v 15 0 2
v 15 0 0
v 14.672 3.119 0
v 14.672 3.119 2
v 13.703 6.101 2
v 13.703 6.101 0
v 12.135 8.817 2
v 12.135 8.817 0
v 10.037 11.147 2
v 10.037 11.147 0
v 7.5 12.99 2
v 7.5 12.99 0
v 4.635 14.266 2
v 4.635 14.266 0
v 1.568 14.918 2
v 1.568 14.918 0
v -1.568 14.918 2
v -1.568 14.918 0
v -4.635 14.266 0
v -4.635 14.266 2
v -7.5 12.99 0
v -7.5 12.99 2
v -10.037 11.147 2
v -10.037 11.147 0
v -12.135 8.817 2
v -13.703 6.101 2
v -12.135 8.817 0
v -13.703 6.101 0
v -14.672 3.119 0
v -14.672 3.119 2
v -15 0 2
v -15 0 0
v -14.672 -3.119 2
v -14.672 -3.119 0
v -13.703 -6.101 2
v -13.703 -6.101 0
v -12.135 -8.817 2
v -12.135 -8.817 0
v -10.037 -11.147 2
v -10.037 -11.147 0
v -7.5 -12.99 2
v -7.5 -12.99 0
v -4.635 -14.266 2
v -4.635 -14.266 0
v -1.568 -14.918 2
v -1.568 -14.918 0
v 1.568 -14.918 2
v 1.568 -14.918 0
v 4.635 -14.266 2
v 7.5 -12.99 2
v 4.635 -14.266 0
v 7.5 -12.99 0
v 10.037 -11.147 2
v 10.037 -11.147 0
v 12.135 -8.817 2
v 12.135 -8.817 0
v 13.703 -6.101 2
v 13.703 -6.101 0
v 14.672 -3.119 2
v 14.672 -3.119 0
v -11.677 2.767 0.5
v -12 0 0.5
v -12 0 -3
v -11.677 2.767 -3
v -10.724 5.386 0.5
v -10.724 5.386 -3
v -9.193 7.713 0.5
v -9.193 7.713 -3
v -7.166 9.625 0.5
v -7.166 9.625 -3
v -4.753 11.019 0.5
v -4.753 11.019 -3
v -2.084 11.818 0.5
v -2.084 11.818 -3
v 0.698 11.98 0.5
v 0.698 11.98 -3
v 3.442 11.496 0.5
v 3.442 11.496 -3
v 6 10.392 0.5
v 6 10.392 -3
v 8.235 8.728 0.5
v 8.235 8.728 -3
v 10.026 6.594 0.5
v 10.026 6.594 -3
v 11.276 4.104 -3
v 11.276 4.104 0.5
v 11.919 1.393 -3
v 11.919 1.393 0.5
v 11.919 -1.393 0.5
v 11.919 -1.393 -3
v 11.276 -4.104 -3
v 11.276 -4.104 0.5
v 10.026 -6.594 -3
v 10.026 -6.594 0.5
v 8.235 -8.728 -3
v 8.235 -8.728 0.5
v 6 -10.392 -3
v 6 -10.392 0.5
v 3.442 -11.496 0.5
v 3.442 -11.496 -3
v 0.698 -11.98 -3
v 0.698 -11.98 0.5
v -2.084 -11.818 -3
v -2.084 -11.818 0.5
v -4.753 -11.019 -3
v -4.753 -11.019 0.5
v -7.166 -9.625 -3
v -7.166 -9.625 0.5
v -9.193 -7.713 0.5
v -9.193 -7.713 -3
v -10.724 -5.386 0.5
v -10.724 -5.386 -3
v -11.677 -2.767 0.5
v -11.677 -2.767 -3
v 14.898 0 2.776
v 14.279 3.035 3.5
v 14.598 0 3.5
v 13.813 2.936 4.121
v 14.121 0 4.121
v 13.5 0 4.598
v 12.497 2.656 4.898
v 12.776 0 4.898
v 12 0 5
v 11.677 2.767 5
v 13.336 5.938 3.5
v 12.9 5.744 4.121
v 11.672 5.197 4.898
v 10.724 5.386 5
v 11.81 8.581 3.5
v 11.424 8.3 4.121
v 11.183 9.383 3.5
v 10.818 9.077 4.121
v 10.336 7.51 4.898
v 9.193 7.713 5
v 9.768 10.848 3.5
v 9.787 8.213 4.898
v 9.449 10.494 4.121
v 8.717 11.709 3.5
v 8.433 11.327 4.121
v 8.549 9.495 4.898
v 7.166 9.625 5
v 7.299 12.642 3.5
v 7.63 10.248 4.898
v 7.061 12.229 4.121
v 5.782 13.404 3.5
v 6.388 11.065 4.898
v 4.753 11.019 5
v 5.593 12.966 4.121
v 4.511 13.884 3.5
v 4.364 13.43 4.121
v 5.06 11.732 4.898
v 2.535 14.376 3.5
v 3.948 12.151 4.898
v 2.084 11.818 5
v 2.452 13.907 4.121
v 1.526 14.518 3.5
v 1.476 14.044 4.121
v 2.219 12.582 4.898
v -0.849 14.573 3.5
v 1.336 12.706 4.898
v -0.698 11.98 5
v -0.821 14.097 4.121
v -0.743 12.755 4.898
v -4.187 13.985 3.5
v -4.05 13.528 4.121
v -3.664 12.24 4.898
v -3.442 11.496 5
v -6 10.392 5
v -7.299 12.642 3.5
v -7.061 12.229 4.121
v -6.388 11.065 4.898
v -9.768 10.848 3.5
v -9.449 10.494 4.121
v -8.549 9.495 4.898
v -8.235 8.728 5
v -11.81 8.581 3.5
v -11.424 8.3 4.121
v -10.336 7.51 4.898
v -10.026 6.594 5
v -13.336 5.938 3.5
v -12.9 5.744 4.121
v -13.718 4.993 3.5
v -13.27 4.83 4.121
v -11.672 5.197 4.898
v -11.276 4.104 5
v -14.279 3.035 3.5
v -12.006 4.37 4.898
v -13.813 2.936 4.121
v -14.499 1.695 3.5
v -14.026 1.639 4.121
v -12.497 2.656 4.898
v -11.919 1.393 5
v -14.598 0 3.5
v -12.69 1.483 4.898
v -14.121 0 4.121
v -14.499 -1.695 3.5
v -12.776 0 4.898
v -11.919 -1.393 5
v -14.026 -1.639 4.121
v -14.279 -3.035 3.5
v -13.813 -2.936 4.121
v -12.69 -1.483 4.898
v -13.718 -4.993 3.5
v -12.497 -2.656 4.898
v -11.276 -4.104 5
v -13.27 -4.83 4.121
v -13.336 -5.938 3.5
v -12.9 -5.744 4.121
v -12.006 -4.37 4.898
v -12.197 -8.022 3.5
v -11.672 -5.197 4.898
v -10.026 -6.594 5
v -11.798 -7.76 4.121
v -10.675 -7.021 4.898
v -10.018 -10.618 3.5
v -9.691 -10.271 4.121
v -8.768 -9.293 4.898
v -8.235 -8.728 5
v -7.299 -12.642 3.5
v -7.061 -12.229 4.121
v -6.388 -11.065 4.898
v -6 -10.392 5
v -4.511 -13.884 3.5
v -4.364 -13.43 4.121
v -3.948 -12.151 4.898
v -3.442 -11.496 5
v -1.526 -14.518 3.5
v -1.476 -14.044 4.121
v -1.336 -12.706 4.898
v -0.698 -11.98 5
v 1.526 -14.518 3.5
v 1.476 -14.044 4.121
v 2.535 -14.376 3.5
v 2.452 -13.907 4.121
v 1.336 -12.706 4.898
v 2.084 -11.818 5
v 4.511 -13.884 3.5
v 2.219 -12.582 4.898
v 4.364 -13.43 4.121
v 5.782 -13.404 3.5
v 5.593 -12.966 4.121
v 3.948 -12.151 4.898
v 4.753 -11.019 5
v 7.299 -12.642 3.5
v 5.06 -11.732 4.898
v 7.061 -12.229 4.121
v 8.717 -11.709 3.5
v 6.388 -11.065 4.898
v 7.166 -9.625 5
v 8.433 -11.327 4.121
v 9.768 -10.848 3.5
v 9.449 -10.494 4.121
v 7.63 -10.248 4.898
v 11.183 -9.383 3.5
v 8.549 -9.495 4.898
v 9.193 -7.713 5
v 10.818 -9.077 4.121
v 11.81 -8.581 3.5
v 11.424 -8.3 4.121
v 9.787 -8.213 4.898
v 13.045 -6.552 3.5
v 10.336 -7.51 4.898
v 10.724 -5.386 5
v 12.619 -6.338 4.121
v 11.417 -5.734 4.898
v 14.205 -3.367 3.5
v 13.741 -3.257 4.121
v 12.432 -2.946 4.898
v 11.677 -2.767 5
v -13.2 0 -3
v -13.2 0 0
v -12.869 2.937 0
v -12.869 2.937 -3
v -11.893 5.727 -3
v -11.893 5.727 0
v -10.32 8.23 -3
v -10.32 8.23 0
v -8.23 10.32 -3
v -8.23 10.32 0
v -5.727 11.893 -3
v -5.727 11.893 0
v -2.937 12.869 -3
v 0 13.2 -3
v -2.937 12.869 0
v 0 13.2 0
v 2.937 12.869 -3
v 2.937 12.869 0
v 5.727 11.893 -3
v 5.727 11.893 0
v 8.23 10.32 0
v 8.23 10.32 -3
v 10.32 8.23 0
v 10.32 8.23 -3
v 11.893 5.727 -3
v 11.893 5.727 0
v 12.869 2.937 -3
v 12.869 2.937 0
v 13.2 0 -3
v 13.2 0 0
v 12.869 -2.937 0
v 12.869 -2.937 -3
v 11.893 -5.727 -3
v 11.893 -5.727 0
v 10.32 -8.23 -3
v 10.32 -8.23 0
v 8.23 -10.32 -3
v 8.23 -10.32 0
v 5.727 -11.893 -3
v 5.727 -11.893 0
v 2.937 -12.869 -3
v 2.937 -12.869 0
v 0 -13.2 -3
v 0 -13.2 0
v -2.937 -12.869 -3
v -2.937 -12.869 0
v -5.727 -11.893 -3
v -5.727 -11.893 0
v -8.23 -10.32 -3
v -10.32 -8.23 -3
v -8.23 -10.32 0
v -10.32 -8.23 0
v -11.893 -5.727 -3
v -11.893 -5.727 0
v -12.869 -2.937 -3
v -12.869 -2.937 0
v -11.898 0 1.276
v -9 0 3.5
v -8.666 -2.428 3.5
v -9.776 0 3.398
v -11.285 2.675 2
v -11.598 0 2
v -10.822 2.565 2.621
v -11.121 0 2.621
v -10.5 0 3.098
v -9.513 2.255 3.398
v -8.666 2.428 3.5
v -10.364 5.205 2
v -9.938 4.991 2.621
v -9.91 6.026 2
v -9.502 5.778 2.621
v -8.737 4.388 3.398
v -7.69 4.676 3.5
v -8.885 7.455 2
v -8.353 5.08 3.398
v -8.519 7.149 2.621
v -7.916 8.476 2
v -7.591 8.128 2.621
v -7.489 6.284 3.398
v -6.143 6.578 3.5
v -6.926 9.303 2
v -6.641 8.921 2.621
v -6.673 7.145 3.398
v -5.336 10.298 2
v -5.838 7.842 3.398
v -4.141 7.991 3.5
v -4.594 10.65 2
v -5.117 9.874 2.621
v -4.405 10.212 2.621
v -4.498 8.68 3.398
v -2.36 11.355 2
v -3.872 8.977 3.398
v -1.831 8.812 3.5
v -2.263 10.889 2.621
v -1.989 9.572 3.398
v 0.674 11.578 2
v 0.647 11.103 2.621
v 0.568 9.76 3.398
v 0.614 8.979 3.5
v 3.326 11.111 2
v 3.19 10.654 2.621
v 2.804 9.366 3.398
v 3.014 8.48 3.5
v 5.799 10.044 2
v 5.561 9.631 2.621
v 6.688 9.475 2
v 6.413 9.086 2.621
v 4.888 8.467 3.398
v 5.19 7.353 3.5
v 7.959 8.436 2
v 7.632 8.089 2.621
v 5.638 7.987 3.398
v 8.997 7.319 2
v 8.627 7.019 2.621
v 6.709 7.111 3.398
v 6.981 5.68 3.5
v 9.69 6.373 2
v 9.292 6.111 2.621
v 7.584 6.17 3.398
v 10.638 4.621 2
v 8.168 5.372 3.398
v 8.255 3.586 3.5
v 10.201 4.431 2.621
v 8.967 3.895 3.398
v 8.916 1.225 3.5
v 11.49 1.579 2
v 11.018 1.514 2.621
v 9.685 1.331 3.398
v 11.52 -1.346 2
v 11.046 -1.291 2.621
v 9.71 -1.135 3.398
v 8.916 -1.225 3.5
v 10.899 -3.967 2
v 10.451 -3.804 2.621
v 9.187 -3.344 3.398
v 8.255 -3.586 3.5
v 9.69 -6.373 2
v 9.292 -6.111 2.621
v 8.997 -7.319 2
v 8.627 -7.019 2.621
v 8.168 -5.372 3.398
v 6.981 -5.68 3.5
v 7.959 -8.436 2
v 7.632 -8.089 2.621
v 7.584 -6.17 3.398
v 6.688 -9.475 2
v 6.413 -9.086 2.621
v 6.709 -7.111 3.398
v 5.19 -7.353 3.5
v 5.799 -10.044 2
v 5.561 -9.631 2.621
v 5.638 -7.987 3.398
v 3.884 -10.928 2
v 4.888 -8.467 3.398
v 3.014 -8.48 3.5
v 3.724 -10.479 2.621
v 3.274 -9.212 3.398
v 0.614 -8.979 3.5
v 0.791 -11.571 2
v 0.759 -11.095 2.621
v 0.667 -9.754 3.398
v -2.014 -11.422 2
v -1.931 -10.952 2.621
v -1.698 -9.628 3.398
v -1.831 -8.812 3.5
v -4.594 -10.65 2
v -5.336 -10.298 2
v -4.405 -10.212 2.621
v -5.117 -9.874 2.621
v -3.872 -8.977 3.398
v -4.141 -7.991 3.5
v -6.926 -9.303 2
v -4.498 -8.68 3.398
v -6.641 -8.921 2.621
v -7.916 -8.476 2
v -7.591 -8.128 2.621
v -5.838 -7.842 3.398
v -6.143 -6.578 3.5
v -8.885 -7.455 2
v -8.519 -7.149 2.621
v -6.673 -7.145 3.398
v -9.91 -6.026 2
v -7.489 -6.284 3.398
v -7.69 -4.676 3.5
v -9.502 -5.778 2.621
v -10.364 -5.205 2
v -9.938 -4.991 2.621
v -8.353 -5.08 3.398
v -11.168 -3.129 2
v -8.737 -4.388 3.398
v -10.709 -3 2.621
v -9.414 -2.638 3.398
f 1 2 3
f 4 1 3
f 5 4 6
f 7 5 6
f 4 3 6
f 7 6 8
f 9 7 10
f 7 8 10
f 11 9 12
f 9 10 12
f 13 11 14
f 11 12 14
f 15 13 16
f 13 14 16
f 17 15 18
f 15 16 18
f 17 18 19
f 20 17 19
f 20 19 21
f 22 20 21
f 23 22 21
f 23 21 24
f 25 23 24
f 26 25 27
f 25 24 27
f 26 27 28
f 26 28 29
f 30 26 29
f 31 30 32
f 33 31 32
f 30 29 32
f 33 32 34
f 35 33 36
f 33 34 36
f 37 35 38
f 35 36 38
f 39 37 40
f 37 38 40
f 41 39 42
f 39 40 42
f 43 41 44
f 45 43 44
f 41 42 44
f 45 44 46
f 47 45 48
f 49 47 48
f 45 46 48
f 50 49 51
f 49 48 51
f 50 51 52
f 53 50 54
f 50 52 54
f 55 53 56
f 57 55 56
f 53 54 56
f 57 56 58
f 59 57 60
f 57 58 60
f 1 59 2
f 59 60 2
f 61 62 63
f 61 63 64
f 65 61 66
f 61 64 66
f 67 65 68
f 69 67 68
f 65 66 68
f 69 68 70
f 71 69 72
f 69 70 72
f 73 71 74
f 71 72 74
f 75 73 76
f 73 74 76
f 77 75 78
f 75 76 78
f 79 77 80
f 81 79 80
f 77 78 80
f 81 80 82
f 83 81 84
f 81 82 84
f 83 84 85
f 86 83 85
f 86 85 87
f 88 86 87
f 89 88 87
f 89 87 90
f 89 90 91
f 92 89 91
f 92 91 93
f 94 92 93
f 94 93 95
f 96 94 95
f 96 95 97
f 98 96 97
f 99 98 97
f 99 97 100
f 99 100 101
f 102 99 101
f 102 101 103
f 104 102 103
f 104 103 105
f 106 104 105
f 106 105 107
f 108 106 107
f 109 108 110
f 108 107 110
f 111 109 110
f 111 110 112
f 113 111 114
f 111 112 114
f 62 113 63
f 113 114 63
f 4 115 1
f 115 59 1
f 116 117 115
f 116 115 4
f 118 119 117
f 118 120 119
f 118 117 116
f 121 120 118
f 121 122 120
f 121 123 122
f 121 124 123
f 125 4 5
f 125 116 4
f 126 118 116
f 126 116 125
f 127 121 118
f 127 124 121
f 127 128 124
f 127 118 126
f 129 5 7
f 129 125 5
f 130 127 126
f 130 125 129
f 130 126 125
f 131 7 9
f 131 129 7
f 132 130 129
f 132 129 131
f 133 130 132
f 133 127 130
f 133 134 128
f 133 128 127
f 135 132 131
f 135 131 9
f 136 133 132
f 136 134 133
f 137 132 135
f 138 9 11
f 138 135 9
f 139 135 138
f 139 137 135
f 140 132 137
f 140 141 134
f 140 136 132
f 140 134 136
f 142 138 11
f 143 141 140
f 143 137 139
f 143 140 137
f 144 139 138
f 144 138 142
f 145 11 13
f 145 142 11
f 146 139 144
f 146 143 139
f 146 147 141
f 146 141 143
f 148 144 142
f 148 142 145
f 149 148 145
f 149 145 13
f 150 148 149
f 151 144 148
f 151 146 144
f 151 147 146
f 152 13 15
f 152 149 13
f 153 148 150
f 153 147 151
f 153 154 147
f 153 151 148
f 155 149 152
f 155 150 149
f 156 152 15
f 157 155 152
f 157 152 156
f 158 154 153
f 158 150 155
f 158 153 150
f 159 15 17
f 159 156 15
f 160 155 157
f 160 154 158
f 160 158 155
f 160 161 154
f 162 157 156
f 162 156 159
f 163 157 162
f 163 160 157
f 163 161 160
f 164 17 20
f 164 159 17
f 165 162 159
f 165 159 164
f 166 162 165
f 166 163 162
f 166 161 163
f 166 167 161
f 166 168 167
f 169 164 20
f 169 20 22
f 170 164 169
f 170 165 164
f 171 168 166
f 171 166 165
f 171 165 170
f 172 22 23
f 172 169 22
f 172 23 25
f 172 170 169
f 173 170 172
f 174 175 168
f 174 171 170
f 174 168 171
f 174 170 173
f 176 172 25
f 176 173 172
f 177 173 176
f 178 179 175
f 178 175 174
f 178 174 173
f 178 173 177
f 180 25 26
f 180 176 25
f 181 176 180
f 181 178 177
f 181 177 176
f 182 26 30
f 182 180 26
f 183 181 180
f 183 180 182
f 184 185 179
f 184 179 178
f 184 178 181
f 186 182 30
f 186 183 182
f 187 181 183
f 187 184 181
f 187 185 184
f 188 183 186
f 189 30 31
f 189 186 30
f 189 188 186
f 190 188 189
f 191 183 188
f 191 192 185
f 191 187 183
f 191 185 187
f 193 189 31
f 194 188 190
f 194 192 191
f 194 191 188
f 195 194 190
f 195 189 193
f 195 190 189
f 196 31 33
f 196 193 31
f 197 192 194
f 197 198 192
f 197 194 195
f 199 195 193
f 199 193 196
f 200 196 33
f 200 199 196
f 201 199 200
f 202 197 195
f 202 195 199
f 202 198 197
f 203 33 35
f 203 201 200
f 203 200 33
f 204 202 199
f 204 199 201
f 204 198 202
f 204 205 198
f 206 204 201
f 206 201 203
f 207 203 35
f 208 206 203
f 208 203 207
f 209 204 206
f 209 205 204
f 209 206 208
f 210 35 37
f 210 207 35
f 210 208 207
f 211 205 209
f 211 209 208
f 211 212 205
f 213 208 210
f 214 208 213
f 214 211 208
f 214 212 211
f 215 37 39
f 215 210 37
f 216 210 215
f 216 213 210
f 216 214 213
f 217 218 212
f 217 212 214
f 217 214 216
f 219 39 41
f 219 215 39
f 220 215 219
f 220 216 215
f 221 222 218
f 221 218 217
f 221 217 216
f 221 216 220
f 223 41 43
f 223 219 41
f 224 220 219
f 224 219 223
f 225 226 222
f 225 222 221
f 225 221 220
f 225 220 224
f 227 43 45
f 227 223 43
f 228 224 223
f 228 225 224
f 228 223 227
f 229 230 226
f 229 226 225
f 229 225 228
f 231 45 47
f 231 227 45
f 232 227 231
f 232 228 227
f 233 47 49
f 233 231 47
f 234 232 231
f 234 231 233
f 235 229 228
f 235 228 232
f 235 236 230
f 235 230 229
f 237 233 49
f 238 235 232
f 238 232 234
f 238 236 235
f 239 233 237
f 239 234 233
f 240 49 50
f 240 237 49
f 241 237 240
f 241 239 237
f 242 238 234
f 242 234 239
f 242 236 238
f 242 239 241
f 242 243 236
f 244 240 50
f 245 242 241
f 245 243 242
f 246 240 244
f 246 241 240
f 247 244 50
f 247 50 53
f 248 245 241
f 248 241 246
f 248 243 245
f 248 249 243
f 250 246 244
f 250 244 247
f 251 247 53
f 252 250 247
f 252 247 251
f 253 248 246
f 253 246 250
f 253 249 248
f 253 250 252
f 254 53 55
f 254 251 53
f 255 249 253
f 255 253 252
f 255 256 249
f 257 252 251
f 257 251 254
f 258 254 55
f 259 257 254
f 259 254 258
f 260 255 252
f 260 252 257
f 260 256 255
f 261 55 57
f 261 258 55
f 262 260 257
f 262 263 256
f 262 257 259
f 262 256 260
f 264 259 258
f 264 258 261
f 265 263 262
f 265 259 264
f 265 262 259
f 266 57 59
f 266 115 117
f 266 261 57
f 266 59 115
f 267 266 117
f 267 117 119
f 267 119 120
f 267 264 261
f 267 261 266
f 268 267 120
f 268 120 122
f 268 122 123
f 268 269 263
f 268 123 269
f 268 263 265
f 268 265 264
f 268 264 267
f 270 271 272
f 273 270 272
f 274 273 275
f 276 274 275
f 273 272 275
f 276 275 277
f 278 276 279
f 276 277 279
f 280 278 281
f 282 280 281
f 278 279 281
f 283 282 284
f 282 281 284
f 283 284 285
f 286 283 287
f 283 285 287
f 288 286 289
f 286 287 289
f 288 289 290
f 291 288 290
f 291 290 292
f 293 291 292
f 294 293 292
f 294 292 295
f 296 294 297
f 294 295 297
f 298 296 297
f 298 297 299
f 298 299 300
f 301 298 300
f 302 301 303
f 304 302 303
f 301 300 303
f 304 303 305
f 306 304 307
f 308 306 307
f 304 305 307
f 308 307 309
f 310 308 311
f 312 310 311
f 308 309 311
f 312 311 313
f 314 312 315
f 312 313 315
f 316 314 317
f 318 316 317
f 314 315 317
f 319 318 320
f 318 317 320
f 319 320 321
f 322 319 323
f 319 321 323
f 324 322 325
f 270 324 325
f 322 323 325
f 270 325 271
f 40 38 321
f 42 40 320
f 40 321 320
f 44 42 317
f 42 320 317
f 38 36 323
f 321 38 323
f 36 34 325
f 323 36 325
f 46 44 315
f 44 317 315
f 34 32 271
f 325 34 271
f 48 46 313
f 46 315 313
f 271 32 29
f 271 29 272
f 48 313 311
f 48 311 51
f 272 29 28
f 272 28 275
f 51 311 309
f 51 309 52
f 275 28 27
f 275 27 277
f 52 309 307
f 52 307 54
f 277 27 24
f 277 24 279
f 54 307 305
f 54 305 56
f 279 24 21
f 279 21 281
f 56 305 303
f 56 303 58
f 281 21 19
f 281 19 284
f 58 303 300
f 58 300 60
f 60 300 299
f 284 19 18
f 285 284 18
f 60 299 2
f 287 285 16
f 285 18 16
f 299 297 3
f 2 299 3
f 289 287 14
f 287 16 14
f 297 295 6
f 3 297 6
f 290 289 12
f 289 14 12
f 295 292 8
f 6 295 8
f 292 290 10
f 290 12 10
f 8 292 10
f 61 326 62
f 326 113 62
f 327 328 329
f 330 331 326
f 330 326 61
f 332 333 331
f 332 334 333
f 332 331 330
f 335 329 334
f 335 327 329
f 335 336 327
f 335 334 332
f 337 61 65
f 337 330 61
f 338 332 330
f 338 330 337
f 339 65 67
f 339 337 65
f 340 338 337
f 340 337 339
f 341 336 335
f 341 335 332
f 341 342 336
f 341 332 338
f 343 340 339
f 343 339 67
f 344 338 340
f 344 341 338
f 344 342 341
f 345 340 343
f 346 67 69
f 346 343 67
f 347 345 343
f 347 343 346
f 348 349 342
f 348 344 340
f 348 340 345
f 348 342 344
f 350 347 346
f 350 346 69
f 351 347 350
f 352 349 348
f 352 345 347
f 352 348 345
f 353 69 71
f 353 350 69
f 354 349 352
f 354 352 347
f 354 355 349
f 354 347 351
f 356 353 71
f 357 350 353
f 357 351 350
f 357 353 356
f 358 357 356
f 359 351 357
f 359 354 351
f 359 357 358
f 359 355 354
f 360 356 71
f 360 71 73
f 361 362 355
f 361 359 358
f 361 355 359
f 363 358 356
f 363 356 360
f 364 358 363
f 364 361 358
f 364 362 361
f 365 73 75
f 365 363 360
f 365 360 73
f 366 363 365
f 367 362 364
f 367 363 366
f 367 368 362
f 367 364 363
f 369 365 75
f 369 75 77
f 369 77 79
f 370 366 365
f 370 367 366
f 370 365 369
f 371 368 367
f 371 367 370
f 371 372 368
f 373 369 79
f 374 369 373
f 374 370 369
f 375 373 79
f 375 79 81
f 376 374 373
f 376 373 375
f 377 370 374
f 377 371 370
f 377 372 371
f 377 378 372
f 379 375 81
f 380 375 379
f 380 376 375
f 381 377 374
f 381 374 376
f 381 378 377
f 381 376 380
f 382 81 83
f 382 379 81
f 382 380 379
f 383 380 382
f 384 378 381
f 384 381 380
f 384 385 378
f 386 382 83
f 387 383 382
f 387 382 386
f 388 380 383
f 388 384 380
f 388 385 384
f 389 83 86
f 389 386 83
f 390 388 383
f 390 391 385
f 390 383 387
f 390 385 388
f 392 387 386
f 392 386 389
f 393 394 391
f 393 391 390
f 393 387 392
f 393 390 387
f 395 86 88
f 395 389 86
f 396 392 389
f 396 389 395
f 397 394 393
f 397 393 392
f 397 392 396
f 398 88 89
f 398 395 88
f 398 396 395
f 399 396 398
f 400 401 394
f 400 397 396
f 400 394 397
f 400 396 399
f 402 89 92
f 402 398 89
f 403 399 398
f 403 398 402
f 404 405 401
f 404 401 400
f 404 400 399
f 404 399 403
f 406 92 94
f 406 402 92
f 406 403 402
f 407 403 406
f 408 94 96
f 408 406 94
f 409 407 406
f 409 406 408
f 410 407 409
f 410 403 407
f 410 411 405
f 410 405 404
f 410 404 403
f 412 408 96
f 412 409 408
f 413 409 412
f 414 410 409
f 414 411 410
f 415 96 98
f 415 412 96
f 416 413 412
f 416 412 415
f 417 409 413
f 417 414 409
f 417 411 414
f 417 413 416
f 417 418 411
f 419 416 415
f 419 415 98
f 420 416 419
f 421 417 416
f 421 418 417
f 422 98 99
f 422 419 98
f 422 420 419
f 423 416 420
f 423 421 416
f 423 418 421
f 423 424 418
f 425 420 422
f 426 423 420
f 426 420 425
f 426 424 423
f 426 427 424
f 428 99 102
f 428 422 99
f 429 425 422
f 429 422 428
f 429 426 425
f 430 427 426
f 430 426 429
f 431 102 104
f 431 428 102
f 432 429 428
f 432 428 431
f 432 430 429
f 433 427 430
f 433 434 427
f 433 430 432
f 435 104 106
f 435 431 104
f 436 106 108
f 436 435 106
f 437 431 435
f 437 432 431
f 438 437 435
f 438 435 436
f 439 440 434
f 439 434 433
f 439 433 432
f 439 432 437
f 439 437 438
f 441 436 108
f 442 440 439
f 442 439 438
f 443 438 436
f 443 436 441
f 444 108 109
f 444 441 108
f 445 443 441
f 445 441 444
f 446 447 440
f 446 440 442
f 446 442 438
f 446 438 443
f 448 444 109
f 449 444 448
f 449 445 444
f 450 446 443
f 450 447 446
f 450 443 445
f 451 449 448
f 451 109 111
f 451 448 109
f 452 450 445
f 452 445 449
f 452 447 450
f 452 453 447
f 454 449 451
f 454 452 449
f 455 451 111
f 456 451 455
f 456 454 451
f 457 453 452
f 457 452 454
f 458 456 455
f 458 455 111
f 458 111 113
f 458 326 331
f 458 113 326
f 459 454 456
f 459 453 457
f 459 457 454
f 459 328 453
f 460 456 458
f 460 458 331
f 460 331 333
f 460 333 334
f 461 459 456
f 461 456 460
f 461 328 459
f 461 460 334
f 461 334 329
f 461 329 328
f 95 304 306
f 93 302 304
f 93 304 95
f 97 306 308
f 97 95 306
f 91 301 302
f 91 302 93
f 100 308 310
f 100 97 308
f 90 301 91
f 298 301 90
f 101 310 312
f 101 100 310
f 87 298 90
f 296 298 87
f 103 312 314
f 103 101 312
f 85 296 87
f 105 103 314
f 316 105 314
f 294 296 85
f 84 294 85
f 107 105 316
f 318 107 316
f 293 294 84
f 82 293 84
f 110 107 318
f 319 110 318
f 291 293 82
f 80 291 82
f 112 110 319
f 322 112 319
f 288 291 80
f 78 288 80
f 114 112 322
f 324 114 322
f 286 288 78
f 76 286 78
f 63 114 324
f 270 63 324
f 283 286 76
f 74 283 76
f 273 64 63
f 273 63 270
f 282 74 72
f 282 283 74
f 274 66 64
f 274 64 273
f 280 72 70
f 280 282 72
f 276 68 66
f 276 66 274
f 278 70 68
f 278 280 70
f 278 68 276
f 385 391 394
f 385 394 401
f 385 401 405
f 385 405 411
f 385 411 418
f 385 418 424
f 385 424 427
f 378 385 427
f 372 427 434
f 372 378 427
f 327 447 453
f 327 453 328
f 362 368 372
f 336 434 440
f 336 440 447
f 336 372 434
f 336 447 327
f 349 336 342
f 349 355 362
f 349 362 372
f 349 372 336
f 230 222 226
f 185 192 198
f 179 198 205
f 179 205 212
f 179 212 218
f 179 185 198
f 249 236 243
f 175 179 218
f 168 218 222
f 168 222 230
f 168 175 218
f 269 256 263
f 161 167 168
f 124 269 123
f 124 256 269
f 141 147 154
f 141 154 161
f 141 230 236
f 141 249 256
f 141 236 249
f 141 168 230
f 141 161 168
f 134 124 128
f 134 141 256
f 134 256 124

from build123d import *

# Parameters (mm, degrees)
SKETCH1_R           = 15
BOSS_EXTRUDE1_DEPTH = 5
FILLET1_R           = 3
SKETCH2_R           = 12
CUT_EXTRUDE1_DEPTH  = 3.5
FILLET2_R           = 3
SKETCH4_R           = 13.2
BOSS_EXTRUDE3_DEPTH = 3
SKETCH5_R           = 12
CUT_EXTRUDE2_DEPTH  = 3


with BuildPart() as part:
    # Sketch1 → Boss-Extrude1 (new body)
    with BuildSketch(Plane.XY):
        Circle(SKETCH1_R)
    extrude(amount=BOSS_EXTRUDE1_DEPTH)

    # Fillet1
    fillet1_edges = [part.edges().sort_by_distance(p)[0] for p in [
        (-15, 0, 5),
    ]]
    fillet(fillet1_edges, radius=FILLET1_R)

    # Sketch2 → Cut-Extrude1 (cut)
    with BuildSketch(Plane(origin=(0, 0, 0), x_dir=(-1, 0, 0), z_dir=(0, 0, -1))):
        Circle(SKETCH2_R)
    extrude(amount=-CUT_EXTRUDE1_DEPTH, mode=Mode.SUBTRACT)

    # Fillet2
    fillet2_edges = [part.edges().sort_by_distance(p)[0] for p in [
        (12, 0, 3.5),
    ]]
    fillet(fillet2_edges, radius=FILLET2_R)

    # Sketch4 → Boss-Extrude3 (add)
    with BuildSketch(Plane(origin=(0, 0, 0), x_dir=(-1, 0, 0), z_dir=(0, 0, -1))):
        Circle(SKETCH4_R)
    extrude(amount=BOSS_EXTRUDE3_DEPTH)

    # Sketch5 → Cut-Extrude2 (cut)
    with BuildSketch(Plane(origin=(0, 0, -3), x_dir=(-1, 0, 0), z_dir=(0, 0, -1))):
        Circle(SKETCH5_R)
    extrude(amount=-CUT_EXTRUDE2_DEPTH, mode=Mode.SUBTRACT)


solid = part.part
